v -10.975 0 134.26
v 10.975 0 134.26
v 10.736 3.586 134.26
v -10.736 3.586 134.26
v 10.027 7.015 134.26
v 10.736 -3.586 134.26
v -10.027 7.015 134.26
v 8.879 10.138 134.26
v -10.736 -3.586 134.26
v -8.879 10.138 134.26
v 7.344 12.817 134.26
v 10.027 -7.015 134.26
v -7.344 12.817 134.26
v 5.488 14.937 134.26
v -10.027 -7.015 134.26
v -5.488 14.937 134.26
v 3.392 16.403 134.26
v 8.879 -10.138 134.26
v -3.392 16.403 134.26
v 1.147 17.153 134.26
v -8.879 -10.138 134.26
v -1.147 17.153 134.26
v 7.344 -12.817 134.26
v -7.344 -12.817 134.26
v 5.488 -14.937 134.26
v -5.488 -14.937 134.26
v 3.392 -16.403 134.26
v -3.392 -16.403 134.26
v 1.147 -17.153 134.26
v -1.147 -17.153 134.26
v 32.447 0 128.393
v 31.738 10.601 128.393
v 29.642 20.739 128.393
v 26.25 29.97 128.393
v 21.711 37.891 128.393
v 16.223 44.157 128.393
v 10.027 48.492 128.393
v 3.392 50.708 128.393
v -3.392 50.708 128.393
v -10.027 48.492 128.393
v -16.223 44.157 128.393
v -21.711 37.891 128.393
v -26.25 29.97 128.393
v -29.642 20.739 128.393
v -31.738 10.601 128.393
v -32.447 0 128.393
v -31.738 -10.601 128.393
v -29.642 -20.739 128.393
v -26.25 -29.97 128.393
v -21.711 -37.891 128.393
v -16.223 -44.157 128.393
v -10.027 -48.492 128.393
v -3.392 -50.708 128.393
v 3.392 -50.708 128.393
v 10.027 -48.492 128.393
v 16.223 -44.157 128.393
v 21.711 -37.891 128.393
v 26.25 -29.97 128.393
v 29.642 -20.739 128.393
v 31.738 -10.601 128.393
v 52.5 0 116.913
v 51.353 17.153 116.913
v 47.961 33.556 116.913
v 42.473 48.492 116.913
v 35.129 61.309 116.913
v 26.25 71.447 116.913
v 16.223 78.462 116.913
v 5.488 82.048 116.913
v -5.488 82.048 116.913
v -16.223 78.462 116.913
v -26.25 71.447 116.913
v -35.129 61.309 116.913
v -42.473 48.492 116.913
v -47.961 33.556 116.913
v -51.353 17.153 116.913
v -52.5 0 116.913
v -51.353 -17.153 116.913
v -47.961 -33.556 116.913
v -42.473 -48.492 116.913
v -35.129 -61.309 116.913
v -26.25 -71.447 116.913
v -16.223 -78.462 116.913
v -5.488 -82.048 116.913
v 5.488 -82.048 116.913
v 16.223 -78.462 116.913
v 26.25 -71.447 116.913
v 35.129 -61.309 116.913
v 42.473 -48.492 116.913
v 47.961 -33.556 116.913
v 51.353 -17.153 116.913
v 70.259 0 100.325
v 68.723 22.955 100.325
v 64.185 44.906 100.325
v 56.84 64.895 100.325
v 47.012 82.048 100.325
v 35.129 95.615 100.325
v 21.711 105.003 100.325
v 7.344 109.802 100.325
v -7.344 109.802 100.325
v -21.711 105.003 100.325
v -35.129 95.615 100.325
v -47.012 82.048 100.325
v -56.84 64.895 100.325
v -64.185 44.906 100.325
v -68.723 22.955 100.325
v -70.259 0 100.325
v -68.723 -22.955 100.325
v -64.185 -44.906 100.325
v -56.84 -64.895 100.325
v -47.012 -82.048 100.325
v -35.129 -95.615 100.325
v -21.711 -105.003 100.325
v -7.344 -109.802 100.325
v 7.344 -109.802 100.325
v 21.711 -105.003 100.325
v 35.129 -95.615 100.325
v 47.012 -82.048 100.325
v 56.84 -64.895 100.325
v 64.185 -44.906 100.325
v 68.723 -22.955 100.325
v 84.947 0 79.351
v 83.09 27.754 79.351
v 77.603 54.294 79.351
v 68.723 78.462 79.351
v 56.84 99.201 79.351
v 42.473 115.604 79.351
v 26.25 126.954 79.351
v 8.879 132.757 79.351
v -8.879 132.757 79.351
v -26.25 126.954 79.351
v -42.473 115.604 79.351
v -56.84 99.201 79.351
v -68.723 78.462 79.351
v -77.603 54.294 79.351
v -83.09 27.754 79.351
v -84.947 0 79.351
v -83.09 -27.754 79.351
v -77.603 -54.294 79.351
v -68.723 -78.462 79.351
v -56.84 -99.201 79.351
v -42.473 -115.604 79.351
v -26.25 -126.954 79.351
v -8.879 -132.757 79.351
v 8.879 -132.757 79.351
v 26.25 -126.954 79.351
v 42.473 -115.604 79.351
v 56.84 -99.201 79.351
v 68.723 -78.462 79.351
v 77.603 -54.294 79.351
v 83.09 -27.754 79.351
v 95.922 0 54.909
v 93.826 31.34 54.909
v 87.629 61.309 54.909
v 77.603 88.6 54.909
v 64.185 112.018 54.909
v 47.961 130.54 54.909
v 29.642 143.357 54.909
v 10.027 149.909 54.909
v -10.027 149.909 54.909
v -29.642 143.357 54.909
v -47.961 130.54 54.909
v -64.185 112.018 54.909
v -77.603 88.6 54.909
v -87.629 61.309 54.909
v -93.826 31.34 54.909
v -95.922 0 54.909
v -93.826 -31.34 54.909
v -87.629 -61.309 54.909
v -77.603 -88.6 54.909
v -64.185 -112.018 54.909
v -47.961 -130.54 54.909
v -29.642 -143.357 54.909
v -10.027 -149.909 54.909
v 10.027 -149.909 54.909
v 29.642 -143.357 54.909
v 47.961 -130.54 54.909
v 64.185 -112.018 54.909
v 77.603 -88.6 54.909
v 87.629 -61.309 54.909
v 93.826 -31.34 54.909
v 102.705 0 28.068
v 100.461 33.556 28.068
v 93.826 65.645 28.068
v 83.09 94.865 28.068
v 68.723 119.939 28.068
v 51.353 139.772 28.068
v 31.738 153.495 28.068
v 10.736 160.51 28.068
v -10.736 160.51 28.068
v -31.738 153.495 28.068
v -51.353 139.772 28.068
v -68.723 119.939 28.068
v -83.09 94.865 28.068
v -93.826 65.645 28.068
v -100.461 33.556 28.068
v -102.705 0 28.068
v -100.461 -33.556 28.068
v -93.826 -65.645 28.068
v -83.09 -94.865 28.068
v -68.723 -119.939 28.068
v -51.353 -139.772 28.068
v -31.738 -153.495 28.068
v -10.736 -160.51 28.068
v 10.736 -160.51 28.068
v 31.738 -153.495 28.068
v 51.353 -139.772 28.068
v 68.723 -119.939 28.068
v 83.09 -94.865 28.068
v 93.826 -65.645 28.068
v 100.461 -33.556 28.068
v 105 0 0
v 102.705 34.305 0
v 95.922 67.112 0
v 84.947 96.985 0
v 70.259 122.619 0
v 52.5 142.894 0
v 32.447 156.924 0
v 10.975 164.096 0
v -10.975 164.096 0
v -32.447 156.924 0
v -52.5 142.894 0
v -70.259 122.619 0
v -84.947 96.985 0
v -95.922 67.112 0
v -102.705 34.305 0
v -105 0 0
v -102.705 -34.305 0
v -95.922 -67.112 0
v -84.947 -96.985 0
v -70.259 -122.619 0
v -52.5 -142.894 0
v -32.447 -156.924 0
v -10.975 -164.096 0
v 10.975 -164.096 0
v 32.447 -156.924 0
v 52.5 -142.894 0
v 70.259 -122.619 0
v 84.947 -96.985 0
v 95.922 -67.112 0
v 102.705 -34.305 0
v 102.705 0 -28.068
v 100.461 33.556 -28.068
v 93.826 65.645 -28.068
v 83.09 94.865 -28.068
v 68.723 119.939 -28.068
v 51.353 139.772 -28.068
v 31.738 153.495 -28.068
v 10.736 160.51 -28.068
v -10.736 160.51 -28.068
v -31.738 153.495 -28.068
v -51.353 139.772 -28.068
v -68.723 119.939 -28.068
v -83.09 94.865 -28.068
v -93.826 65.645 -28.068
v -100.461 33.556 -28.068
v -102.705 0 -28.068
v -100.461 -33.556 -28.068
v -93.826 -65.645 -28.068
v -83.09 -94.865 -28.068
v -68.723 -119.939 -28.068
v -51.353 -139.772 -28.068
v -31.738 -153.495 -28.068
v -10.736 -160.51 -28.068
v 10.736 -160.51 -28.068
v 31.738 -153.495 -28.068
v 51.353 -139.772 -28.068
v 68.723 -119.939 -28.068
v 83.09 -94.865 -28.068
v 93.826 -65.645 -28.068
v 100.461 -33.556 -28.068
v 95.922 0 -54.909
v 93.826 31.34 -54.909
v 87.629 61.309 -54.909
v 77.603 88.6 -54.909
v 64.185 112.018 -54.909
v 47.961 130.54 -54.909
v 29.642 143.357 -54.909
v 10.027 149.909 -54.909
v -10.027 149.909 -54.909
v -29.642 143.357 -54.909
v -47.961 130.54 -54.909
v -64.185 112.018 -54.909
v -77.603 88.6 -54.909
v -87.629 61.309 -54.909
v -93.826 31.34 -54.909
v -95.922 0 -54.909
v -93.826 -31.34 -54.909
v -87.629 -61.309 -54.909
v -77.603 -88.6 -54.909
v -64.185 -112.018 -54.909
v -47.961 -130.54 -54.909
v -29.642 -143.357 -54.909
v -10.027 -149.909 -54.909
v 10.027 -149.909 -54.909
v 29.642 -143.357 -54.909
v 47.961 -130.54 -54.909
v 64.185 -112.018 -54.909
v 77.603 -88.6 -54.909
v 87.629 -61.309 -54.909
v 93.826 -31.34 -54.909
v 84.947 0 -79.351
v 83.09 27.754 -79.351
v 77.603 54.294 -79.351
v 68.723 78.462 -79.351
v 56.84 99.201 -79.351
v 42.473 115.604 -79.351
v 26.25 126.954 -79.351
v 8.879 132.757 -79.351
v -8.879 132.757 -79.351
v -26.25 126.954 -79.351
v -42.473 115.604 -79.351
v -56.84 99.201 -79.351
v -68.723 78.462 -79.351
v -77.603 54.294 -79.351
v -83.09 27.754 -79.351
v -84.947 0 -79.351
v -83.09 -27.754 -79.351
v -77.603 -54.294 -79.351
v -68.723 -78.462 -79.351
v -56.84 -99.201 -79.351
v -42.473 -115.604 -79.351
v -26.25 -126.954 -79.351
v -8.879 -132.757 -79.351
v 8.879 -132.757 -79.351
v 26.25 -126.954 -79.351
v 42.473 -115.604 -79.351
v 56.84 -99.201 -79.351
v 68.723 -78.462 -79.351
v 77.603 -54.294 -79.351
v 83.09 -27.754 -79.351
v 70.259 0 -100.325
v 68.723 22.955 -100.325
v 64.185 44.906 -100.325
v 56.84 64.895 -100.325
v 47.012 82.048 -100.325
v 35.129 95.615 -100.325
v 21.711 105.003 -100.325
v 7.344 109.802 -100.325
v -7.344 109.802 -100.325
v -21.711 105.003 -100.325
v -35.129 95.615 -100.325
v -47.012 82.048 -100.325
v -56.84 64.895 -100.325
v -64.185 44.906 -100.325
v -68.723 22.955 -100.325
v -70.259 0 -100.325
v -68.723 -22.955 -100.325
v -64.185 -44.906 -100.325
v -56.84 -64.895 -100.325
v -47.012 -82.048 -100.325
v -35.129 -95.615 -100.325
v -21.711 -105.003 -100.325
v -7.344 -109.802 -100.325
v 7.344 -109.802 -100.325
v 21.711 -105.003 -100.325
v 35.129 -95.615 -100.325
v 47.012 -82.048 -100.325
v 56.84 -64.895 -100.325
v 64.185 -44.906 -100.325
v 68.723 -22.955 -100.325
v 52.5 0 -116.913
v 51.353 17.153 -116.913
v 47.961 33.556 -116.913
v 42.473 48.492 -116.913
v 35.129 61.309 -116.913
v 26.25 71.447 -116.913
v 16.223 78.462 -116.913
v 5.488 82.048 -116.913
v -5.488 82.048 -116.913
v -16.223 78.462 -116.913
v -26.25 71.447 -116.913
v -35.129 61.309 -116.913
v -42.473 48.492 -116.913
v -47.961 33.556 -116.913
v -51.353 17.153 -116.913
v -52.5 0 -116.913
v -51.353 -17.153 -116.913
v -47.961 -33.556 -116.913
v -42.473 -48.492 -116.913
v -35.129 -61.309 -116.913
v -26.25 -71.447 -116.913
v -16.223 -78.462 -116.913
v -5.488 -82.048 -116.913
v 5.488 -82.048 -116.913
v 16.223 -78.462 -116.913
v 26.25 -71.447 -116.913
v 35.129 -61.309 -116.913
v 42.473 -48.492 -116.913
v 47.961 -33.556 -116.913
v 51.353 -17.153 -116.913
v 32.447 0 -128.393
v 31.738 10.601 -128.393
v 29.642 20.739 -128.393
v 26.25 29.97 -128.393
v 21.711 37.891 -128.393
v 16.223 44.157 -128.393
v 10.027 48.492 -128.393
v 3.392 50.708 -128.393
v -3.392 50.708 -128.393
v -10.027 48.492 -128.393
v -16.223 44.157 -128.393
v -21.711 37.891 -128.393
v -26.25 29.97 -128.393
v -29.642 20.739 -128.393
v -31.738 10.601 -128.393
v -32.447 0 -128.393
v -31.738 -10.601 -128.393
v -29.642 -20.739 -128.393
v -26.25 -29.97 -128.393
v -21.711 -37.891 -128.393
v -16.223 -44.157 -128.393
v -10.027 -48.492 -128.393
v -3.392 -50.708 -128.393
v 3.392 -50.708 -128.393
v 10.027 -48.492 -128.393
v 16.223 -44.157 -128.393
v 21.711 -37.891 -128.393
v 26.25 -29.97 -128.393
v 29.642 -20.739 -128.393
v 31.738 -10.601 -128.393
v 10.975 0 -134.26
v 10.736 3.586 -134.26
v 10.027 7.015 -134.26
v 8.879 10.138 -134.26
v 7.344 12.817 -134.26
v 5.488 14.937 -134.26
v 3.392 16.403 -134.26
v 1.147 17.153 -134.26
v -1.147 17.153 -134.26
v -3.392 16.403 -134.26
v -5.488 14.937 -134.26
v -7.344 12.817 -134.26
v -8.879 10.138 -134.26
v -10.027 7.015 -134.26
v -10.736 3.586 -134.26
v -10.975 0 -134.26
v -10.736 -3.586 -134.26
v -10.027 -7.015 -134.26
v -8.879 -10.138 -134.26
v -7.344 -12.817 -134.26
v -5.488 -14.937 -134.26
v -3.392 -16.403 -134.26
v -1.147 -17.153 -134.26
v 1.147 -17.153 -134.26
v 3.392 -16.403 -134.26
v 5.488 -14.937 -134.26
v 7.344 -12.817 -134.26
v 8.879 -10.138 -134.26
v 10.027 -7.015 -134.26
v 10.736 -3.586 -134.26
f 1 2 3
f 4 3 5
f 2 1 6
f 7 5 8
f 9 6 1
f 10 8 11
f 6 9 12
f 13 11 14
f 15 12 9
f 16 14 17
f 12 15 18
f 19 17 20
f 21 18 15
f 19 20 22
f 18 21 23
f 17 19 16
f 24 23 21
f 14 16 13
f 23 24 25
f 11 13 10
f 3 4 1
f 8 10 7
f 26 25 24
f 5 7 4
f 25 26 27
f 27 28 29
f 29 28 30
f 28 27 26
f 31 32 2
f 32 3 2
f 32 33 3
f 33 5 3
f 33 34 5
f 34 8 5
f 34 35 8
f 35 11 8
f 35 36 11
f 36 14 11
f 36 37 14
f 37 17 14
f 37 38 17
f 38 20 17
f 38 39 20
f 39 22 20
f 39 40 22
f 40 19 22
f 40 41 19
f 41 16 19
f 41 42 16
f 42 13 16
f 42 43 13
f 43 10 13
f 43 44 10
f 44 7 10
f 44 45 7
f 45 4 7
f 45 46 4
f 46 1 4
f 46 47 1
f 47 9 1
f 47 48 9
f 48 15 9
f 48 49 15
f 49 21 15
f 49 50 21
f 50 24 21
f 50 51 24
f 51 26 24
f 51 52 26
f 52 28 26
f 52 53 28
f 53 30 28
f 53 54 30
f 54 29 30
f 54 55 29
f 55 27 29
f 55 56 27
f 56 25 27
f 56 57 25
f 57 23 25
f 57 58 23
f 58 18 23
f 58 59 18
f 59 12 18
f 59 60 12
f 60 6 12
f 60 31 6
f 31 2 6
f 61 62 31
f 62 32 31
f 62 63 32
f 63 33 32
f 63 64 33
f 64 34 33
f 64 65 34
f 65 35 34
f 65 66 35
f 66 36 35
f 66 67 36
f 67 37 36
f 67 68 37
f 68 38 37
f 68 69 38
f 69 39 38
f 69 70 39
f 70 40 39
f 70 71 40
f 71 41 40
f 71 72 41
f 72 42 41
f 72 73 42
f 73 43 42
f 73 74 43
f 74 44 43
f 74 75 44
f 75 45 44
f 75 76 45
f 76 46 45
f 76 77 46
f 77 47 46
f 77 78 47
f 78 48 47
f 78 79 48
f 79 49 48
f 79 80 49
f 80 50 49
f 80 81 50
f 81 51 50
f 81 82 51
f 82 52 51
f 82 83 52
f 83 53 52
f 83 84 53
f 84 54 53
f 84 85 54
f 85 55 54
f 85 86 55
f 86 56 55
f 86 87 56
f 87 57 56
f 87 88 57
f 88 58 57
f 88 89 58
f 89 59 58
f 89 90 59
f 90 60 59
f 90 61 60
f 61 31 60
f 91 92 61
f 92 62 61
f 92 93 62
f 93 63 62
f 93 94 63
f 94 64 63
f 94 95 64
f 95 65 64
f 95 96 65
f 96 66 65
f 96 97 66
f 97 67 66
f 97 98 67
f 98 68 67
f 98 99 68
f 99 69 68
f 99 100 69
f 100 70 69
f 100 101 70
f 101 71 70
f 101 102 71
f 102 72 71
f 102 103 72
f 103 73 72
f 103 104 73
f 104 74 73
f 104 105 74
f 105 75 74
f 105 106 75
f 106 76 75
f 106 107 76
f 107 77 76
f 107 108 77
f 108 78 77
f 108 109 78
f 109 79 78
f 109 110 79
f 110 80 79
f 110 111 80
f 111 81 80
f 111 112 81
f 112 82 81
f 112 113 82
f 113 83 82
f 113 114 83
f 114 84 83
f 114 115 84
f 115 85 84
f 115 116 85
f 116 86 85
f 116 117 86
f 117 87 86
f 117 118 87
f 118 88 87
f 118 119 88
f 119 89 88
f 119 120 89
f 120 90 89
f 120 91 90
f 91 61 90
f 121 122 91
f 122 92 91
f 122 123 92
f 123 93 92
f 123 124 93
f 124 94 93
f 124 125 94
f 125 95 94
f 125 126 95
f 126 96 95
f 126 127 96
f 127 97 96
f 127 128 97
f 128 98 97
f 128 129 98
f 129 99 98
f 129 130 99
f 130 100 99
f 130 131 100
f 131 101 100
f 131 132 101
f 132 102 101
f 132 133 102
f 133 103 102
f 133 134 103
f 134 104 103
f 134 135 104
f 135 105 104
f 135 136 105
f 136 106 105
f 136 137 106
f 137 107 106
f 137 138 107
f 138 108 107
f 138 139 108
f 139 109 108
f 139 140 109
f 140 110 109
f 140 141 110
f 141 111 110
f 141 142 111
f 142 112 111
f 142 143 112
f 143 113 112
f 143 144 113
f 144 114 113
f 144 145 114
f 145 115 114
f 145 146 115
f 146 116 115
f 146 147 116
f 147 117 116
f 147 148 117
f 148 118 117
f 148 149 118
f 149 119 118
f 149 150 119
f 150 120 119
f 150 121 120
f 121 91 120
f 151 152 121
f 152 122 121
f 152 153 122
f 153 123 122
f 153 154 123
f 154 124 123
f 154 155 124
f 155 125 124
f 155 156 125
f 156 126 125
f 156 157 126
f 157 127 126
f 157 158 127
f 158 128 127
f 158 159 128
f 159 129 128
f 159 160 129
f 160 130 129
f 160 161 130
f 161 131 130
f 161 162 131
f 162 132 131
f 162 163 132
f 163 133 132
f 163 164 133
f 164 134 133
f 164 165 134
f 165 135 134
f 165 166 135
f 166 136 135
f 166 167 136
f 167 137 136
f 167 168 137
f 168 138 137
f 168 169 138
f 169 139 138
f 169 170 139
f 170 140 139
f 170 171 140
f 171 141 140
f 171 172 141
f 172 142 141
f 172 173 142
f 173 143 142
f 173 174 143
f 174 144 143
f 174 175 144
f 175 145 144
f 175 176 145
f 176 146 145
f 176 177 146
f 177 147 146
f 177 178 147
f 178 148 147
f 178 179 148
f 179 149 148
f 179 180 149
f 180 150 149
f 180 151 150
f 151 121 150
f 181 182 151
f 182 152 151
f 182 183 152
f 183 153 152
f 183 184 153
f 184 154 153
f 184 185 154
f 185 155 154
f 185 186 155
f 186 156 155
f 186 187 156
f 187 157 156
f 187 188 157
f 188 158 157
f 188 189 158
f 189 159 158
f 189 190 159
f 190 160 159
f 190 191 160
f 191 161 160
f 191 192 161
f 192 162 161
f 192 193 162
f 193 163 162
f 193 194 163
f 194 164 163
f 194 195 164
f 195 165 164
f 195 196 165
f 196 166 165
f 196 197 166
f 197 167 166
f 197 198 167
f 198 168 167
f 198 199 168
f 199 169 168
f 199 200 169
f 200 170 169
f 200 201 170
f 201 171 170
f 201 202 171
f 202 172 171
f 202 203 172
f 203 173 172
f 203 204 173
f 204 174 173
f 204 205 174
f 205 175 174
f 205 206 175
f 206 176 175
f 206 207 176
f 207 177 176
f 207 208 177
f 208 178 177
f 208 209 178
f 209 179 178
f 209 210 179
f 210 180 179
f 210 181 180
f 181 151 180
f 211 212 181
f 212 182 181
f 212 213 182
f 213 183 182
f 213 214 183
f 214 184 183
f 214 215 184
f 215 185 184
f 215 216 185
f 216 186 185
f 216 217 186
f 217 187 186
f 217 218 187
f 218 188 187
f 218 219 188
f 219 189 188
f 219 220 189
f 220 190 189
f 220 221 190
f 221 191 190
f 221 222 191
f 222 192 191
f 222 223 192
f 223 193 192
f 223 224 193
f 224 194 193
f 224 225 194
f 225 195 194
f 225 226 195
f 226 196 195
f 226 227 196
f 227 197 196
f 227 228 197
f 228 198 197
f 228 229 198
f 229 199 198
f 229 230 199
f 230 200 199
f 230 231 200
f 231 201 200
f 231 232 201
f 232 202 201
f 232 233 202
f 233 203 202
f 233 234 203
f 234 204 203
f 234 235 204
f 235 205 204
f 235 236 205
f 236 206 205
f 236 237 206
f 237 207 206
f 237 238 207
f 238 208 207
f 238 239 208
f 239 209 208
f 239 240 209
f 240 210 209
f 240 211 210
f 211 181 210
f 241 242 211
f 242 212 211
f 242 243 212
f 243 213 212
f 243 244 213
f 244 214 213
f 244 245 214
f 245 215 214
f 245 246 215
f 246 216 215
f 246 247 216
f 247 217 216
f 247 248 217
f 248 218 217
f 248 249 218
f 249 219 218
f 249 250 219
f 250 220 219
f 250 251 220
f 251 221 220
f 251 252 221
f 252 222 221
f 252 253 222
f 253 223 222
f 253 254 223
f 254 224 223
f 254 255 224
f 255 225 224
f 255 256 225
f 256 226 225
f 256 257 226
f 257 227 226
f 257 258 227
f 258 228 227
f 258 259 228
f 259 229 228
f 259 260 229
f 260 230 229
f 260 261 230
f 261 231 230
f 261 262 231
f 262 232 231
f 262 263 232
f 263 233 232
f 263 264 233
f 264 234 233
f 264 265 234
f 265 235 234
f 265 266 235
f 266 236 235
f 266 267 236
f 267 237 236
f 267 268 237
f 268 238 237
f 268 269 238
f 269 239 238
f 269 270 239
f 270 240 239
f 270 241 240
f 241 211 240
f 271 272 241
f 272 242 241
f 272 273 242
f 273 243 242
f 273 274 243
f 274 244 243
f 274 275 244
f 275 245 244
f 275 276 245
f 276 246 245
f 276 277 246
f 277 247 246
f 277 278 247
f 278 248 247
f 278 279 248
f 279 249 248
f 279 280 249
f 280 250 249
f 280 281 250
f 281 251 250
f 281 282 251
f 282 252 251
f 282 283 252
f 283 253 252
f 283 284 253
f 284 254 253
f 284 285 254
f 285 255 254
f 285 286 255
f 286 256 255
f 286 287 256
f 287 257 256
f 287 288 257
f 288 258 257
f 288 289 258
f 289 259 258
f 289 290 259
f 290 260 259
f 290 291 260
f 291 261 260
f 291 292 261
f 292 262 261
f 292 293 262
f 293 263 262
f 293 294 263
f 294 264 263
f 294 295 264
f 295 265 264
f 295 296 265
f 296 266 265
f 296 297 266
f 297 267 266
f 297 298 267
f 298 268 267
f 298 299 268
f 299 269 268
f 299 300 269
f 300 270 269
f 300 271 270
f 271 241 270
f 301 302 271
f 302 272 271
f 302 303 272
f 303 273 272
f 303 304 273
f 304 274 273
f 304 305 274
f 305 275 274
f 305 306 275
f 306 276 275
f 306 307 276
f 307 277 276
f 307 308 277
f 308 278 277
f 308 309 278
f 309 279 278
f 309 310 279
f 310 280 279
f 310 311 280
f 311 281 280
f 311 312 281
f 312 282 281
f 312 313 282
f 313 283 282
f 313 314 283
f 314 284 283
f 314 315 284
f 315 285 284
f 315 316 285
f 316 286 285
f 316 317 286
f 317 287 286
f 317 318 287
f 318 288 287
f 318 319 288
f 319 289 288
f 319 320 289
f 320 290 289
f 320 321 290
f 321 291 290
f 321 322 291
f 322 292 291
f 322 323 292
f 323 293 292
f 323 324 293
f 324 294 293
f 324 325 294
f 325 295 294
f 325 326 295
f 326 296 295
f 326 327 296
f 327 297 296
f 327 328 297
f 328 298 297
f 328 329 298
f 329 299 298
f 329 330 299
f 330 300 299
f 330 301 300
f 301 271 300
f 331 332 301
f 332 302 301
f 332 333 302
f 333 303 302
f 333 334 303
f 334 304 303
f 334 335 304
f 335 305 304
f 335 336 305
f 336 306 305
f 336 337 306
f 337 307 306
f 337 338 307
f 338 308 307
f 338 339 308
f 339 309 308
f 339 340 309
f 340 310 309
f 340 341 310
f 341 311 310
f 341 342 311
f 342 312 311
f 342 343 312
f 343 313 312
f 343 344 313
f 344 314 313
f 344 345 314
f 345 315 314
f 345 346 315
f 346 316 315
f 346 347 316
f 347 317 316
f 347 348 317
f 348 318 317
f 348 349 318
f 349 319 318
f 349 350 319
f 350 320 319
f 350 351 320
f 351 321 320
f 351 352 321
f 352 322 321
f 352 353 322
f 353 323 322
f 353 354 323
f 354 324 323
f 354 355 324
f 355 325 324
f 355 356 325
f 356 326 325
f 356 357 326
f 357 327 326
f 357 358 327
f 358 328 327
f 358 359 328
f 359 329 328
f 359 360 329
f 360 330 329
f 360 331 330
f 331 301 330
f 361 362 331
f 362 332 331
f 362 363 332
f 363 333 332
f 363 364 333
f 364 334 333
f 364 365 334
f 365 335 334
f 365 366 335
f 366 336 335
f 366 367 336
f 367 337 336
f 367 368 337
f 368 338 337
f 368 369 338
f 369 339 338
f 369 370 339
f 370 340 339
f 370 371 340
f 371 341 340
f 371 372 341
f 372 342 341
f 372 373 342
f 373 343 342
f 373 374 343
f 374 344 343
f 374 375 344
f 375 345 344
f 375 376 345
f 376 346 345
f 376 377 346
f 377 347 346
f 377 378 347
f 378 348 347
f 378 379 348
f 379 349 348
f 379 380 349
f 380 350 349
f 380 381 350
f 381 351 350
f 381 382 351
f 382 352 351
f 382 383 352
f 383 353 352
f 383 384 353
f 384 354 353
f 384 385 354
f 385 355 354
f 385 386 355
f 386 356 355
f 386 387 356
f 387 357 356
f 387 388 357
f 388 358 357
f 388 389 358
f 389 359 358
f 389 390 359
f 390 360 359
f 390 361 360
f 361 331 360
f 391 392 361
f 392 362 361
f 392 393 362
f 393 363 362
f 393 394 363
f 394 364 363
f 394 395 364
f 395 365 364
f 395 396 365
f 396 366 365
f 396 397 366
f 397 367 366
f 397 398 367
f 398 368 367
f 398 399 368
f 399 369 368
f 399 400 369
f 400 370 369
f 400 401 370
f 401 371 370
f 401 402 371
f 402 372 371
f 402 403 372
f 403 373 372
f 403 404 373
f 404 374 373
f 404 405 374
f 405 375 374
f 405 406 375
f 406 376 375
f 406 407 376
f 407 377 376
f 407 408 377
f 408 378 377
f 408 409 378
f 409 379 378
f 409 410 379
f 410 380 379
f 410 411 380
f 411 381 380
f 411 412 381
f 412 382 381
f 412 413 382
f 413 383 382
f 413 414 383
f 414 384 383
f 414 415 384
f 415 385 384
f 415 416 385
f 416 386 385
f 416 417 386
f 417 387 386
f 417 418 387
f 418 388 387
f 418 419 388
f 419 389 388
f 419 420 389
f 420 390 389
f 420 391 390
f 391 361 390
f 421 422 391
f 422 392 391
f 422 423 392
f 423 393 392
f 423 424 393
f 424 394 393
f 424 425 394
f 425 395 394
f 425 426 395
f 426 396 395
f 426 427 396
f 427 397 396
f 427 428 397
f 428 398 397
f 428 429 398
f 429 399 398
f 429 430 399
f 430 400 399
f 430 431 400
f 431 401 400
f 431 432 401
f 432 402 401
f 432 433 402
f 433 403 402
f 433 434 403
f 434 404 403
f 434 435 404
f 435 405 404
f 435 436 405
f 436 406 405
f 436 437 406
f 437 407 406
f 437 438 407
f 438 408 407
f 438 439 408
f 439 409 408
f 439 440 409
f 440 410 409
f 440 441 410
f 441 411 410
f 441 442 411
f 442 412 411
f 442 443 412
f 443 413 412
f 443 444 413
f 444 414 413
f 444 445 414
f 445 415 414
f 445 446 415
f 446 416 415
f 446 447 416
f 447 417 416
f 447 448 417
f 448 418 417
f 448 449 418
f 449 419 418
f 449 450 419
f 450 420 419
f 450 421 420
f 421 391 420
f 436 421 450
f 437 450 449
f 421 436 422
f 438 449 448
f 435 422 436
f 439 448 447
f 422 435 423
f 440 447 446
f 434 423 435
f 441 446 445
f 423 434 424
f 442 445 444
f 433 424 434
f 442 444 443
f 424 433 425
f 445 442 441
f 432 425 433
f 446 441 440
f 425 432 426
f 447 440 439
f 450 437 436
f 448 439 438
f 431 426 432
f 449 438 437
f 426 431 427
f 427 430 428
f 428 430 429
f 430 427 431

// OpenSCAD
// Generated by SolidPython 1.0.1 on 2020-07-29 00:46:47


scale(v = [7, 11, 9]) {
	sphere(r = 15);
}
/***********************************************
*********      SolidPython code:      **********
************************************************
 
# import packages: SolidPython
from solid import *
from solid.utils import *
from itertools import chain, combinations, permutations


class Resize:

    def __init__(self, scad_file):
        self.scad_file = scad_file
        #self.scad_file = import_scad(scad_file)
        # cone/cylinder param:
        self.r1 = 0
        self.r2 = 0
        self.h = 0
        # rectangular prism param:
        self.w = 0
        self.l = 0
        # ellipse param:
        self.r = 0

    # import OpenScad code (file name corresponds to shape)


    # classify shape + parameters
    def assign(self, param1, param2, param3):
        if self.scad_file == 'cone.scad':
            self.r1 = param1
            self.r2 = param2
            self.h = param3
        elif self.scad_file == 'cylinder.scad':
            self.r1 = param1
            self.r2 = param2
            self.h = param3
        elif self.scad_file == 'rectangularPrism.scad':
            self.h = param1
            self.l = param2
            self.w = param3
        else:
            self.r = param1
            self.h = param2

    # resize parameters
    def iterate(self):
        x = range(3, 20, 2)
        i = 1
        if self.scad_file == 'cone.scad':
            tempList = list(permutations(x, 2))
            for temp in tempList:
                param1 = temp[0]
                param2 = temp[1]
                filepath = 'produced_scad_files/' + 'cone' + str(param1) + '_' + str(param2) + '_' + '.scad'
                scad_render_to_file(cylinder(h=param1, r1=param2, r2=0), filepath)

        elif self.scad_file == 'cylinder.scad':
            tempList = list(permutations(x, 3))
            for temp in tempList:
                param1 = temp[0]
                param2 = temp[1]
                filepath = 'produced_scad_files/' + 'cylinder' + str(param1) + '_' + str(param2) + '_' + '.scad'
                scad_render_to_file(cylinder(h=param1, r1=param2, r2=param2), filepath)

        elif self.scad_file == 'rectangularPrism.scad':
            tempList = list(permutations(x, 3))
            for temp in tempList:
                param1 = temp[0]
                param2 = temp[1]
                param3 = temp[2]
                filepath = 'produced_scad_files/' + 'rectangularPrism' + str(param1) + '_' + str(param2) + '_' + str(
                    param3) + '.scad'
                scad_render_to_file(cube(size=(param1, param2, param3)), filepath)

        elif self.scad_file == 'ellipse.scad':
            tempList = list(permutations(x, 4))
            for temp in tempList:
                param1 = temp[0]
                param2 = temp[1]
                param3 = temp[2]
                param4 = temp[3]
                filepath = 'produced_scad_files/' + 'ellipse' + str(param1) + '_' + str(param2) + '_' + str(param3) + '_' + str(param4) + '.scad'
                scad_render_to_file(scale([param1, param2, param3])(sphere(r=param4)), filepath)

    def render_to_scadfile(self):
        scad_render_to_file(scad, 'example.scad') 
 
************************************************/
